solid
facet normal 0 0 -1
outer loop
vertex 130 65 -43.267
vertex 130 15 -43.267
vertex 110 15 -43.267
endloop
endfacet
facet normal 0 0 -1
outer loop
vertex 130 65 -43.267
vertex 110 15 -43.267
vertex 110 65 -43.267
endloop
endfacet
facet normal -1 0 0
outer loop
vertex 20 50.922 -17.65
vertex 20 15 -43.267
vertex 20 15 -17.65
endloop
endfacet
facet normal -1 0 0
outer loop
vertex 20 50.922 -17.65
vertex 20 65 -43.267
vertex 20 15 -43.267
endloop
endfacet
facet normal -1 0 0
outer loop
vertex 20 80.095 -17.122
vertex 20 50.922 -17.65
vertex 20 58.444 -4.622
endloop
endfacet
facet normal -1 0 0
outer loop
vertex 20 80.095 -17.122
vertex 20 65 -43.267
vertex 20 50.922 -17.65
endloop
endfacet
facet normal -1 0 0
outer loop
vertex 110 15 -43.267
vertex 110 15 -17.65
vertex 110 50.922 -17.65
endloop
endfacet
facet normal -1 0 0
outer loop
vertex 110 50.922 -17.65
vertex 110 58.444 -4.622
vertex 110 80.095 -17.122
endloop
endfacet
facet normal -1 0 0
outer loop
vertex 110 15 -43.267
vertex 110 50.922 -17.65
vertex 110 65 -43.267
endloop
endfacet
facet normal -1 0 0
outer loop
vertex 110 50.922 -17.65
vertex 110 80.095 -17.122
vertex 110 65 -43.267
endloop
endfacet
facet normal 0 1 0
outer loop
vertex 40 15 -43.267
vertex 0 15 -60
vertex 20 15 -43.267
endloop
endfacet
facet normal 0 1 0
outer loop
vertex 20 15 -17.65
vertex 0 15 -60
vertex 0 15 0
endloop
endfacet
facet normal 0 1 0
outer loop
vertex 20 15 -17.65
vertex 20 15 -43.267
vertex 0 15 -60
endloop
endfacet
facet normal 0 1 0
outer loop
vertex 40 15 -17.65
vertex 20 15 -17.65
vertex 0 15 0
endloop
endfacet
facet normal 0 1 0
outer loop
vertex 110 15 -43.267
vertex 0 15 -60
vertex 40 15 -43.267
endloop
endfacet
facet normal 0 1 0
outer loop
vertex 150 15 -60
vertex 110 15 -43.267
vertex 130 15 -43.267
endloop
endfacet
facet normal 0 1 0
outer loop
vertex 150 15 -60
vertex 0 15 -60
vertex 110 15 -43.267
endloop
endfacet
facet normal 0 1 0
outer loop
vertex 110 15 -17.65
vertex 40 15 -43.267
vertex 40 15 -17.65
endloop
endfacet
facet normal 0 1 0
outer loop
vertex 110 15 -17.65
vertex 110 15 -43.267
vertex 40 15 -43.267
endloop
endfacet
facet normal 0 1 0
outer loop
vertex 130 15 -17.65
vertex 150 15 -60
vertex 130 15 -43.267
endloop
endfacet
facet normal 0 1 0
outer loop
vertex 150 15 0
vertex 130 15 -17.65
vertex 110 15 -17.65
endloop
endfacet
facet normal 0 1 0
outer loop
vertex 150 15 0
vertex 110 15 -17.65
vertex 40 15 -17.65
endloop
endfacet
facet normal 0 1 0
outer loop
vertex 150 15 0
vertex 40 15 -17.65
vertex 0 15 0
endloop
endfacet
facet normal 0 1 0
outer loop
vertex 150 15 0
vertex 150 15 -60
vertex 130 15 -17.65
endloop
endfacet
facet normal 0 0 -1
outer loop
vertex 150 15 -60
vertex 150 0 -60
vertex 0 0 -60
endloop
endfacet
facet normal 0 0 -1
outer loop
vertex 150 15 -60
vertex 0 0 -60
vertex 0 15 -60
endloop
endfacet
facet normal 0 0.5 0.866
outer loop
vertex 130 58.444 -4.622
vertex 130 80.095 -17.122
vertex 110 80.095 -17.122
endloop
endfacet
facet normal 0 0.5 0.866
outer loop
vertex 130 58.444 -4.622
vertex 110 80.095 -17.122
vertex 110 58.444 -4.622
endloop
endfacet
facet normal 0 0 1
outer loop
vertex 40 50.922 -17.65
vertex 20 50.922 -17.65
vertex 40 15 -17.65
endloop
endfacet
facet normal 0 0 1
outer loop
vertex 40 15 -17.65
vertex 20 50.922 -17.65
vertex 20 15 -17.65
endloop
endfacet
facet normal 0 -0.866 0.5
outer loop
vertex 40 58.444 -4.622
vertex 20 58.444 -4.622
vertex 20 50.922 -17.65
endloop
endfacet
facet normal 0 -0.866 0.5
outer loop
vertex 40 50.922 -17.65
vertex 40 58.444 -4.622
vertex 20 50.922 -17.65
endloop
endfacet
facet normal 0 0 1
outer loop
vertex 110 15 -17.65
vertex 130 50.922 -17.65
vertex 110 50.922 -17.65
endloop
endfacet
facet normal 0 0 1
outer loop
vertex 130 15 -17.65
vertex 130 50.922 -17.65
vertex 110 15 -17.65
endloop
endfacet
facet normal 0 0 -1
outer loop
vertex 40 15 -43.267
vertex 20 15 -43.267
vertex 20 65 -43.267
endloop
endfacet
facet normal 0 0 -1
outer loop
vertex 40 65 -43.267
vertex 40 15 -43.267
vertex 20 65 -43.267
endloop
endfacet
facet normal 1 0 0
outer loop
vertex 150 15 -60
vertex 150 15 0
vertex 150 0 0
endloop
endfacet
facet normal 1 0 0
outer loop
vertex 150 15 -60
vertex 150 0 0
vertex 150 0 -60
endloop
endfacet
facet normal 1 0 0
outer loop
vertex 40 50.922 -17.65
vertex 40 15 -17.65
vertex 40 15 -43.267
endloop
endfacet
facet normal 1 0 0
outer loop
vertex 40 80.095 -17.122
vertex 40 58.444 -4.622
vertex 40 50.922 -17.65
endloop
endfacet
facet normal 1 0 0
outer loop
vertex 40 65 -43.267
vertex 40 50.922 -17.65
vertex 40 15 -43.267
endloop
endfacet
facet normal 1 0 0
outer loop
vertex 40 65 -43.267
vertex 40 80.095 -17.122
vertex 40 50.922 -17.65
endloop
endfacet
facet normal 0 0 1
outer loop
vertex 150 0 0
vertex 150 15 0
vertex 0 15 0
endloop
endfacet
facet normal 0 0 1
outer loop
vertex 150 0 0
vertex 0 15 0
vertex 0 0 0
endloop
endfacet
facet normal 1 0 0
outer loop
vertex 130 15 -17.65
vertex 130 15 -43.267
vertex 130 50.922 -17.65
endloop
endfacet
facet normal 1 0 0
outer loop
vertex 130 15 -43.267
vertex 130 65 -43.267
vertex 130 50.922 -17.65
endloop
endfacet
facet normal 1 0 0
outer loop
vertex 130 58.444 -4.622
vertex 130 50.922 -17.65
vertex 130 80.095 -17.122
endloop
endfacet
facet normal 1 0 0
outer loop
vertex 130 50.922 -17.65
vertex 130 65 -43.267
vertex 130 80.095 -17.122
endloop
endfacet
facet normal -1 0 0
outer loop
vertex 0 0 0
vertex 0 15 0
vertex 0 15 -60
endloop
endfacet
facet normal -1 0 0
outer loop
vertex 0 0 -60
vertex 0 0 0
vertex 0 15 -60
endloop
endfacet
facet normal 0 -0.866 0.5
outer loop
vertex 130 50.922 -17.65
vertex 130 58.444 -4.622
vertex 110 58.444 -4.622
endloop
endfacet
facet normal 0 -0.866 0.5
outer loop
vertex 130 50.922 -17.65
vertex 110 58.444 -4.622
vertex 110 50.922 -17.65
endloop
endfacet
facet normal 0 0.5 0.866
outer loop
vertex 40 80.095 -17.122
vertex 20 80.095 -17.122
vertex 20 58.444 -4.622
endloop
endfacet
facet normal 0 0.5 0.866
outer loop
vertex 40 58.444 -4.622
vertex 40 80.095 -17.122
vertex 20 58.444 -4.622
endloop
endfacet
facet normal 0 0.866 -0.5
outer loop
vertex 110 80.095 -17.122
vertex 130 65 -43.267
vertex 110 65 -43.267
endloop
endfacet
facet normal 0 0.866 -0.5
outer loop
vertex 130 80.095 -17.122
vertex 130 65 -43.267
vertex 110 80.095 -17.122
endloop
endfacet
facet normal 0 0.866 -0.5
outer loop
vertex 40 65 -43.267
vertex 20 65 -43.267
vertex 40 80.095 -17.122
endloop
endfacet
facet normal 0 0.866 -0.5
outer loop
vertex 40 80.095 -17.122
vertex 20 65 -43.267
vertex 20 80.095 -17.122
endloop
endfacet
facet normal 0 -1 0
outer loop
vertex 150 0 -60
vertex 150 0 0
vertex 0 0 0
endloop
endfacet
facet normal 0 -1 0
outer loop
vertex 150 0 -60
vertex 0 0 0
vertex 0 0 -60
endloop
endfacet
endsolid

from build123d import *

# Parameters (mm, degrees)
BOSS_EXTRUDE1_DEPTH = 75
CUT_EXTRUDE5_DEPTH  = 20
CUT_EXTRUDE6_DEPTH  = 35


with BuildPart() as part:
    # Sketch1 → Boss-Extrude1 (new body)
    with BuildSketch(Plane(origin=(0, 0, 0), x_dir=(0, 0, -1), z_dir=(1, 0, 0))):
        Polygon((0, 0), (60, 0), (60, 15), (43.266704148, 15), (43.266704148, 65), (17.121672742, 80.09484092), (4.621672742, 58.444205825), (17.650132663, 50.922220983), (17.650132663, 15), (0, 15), align=None)
    boss_extrude1 = extrude(amount=BOSS_EXTRUDE1_DEPTH)

    # Sketch6 → Cut-Extrude5 (cut)
    with BuildSketch(Plane.ZY):
        Polygon((-43.266704148, 15), (-17.650132663, 15), (-17.650132663, 50.922220983), (-4.621672742, 58.444205825), (-17.121672742, 80.09484092), (-43.266704148, 65), align=None)
    cut_extrude5 = extrude(amount=-CUT_EXTRUDE5_DEPTH, mode=Mode.SUBTRACT)

    # Sketch7 → Cut-Extrude6 (cut)
    with BuildSketch(Plane(origin=(75, 0, 0), x_dir=(0, 0, -1), z_dir=(1, 0, 0))):
        Polygon((17.650132663, 15), (43.266704148, 15), (43.266704148, 65), (17.121672742, 80.09484092), (4.621672742, 58.444205825), (17.650132663, 50.922220983), align=None)
    cut_extrude6 = extrude(amount=-CUT_EXTRUDE6_DEPTH, mode=Mode.SUBTRACT)

    # Mirror2: Boss-Extrude1, Cut-Extrude5, Cut-Extrude6 across plane
    add(boss_extrude1.mirror(Plane(origin=(75, 0, 0), x_dir=(0, 0, 1), z_dir=(1, 0, 0))))
    add(cut_extrude5.mirror(Plane(origin=(75, 0, 0), x_dir=(0, 0, 1), z_dir=(1, 0, 0))), mode=Mode.SUBTRACT)
    add(cut_extrude6.mirror(Plane(origin=(75, 0, 0), x_dir=(0, 0, 1), z_dir=(1, 0, 0))), mode=Mode.SUBTRACT)


solid = part.part
